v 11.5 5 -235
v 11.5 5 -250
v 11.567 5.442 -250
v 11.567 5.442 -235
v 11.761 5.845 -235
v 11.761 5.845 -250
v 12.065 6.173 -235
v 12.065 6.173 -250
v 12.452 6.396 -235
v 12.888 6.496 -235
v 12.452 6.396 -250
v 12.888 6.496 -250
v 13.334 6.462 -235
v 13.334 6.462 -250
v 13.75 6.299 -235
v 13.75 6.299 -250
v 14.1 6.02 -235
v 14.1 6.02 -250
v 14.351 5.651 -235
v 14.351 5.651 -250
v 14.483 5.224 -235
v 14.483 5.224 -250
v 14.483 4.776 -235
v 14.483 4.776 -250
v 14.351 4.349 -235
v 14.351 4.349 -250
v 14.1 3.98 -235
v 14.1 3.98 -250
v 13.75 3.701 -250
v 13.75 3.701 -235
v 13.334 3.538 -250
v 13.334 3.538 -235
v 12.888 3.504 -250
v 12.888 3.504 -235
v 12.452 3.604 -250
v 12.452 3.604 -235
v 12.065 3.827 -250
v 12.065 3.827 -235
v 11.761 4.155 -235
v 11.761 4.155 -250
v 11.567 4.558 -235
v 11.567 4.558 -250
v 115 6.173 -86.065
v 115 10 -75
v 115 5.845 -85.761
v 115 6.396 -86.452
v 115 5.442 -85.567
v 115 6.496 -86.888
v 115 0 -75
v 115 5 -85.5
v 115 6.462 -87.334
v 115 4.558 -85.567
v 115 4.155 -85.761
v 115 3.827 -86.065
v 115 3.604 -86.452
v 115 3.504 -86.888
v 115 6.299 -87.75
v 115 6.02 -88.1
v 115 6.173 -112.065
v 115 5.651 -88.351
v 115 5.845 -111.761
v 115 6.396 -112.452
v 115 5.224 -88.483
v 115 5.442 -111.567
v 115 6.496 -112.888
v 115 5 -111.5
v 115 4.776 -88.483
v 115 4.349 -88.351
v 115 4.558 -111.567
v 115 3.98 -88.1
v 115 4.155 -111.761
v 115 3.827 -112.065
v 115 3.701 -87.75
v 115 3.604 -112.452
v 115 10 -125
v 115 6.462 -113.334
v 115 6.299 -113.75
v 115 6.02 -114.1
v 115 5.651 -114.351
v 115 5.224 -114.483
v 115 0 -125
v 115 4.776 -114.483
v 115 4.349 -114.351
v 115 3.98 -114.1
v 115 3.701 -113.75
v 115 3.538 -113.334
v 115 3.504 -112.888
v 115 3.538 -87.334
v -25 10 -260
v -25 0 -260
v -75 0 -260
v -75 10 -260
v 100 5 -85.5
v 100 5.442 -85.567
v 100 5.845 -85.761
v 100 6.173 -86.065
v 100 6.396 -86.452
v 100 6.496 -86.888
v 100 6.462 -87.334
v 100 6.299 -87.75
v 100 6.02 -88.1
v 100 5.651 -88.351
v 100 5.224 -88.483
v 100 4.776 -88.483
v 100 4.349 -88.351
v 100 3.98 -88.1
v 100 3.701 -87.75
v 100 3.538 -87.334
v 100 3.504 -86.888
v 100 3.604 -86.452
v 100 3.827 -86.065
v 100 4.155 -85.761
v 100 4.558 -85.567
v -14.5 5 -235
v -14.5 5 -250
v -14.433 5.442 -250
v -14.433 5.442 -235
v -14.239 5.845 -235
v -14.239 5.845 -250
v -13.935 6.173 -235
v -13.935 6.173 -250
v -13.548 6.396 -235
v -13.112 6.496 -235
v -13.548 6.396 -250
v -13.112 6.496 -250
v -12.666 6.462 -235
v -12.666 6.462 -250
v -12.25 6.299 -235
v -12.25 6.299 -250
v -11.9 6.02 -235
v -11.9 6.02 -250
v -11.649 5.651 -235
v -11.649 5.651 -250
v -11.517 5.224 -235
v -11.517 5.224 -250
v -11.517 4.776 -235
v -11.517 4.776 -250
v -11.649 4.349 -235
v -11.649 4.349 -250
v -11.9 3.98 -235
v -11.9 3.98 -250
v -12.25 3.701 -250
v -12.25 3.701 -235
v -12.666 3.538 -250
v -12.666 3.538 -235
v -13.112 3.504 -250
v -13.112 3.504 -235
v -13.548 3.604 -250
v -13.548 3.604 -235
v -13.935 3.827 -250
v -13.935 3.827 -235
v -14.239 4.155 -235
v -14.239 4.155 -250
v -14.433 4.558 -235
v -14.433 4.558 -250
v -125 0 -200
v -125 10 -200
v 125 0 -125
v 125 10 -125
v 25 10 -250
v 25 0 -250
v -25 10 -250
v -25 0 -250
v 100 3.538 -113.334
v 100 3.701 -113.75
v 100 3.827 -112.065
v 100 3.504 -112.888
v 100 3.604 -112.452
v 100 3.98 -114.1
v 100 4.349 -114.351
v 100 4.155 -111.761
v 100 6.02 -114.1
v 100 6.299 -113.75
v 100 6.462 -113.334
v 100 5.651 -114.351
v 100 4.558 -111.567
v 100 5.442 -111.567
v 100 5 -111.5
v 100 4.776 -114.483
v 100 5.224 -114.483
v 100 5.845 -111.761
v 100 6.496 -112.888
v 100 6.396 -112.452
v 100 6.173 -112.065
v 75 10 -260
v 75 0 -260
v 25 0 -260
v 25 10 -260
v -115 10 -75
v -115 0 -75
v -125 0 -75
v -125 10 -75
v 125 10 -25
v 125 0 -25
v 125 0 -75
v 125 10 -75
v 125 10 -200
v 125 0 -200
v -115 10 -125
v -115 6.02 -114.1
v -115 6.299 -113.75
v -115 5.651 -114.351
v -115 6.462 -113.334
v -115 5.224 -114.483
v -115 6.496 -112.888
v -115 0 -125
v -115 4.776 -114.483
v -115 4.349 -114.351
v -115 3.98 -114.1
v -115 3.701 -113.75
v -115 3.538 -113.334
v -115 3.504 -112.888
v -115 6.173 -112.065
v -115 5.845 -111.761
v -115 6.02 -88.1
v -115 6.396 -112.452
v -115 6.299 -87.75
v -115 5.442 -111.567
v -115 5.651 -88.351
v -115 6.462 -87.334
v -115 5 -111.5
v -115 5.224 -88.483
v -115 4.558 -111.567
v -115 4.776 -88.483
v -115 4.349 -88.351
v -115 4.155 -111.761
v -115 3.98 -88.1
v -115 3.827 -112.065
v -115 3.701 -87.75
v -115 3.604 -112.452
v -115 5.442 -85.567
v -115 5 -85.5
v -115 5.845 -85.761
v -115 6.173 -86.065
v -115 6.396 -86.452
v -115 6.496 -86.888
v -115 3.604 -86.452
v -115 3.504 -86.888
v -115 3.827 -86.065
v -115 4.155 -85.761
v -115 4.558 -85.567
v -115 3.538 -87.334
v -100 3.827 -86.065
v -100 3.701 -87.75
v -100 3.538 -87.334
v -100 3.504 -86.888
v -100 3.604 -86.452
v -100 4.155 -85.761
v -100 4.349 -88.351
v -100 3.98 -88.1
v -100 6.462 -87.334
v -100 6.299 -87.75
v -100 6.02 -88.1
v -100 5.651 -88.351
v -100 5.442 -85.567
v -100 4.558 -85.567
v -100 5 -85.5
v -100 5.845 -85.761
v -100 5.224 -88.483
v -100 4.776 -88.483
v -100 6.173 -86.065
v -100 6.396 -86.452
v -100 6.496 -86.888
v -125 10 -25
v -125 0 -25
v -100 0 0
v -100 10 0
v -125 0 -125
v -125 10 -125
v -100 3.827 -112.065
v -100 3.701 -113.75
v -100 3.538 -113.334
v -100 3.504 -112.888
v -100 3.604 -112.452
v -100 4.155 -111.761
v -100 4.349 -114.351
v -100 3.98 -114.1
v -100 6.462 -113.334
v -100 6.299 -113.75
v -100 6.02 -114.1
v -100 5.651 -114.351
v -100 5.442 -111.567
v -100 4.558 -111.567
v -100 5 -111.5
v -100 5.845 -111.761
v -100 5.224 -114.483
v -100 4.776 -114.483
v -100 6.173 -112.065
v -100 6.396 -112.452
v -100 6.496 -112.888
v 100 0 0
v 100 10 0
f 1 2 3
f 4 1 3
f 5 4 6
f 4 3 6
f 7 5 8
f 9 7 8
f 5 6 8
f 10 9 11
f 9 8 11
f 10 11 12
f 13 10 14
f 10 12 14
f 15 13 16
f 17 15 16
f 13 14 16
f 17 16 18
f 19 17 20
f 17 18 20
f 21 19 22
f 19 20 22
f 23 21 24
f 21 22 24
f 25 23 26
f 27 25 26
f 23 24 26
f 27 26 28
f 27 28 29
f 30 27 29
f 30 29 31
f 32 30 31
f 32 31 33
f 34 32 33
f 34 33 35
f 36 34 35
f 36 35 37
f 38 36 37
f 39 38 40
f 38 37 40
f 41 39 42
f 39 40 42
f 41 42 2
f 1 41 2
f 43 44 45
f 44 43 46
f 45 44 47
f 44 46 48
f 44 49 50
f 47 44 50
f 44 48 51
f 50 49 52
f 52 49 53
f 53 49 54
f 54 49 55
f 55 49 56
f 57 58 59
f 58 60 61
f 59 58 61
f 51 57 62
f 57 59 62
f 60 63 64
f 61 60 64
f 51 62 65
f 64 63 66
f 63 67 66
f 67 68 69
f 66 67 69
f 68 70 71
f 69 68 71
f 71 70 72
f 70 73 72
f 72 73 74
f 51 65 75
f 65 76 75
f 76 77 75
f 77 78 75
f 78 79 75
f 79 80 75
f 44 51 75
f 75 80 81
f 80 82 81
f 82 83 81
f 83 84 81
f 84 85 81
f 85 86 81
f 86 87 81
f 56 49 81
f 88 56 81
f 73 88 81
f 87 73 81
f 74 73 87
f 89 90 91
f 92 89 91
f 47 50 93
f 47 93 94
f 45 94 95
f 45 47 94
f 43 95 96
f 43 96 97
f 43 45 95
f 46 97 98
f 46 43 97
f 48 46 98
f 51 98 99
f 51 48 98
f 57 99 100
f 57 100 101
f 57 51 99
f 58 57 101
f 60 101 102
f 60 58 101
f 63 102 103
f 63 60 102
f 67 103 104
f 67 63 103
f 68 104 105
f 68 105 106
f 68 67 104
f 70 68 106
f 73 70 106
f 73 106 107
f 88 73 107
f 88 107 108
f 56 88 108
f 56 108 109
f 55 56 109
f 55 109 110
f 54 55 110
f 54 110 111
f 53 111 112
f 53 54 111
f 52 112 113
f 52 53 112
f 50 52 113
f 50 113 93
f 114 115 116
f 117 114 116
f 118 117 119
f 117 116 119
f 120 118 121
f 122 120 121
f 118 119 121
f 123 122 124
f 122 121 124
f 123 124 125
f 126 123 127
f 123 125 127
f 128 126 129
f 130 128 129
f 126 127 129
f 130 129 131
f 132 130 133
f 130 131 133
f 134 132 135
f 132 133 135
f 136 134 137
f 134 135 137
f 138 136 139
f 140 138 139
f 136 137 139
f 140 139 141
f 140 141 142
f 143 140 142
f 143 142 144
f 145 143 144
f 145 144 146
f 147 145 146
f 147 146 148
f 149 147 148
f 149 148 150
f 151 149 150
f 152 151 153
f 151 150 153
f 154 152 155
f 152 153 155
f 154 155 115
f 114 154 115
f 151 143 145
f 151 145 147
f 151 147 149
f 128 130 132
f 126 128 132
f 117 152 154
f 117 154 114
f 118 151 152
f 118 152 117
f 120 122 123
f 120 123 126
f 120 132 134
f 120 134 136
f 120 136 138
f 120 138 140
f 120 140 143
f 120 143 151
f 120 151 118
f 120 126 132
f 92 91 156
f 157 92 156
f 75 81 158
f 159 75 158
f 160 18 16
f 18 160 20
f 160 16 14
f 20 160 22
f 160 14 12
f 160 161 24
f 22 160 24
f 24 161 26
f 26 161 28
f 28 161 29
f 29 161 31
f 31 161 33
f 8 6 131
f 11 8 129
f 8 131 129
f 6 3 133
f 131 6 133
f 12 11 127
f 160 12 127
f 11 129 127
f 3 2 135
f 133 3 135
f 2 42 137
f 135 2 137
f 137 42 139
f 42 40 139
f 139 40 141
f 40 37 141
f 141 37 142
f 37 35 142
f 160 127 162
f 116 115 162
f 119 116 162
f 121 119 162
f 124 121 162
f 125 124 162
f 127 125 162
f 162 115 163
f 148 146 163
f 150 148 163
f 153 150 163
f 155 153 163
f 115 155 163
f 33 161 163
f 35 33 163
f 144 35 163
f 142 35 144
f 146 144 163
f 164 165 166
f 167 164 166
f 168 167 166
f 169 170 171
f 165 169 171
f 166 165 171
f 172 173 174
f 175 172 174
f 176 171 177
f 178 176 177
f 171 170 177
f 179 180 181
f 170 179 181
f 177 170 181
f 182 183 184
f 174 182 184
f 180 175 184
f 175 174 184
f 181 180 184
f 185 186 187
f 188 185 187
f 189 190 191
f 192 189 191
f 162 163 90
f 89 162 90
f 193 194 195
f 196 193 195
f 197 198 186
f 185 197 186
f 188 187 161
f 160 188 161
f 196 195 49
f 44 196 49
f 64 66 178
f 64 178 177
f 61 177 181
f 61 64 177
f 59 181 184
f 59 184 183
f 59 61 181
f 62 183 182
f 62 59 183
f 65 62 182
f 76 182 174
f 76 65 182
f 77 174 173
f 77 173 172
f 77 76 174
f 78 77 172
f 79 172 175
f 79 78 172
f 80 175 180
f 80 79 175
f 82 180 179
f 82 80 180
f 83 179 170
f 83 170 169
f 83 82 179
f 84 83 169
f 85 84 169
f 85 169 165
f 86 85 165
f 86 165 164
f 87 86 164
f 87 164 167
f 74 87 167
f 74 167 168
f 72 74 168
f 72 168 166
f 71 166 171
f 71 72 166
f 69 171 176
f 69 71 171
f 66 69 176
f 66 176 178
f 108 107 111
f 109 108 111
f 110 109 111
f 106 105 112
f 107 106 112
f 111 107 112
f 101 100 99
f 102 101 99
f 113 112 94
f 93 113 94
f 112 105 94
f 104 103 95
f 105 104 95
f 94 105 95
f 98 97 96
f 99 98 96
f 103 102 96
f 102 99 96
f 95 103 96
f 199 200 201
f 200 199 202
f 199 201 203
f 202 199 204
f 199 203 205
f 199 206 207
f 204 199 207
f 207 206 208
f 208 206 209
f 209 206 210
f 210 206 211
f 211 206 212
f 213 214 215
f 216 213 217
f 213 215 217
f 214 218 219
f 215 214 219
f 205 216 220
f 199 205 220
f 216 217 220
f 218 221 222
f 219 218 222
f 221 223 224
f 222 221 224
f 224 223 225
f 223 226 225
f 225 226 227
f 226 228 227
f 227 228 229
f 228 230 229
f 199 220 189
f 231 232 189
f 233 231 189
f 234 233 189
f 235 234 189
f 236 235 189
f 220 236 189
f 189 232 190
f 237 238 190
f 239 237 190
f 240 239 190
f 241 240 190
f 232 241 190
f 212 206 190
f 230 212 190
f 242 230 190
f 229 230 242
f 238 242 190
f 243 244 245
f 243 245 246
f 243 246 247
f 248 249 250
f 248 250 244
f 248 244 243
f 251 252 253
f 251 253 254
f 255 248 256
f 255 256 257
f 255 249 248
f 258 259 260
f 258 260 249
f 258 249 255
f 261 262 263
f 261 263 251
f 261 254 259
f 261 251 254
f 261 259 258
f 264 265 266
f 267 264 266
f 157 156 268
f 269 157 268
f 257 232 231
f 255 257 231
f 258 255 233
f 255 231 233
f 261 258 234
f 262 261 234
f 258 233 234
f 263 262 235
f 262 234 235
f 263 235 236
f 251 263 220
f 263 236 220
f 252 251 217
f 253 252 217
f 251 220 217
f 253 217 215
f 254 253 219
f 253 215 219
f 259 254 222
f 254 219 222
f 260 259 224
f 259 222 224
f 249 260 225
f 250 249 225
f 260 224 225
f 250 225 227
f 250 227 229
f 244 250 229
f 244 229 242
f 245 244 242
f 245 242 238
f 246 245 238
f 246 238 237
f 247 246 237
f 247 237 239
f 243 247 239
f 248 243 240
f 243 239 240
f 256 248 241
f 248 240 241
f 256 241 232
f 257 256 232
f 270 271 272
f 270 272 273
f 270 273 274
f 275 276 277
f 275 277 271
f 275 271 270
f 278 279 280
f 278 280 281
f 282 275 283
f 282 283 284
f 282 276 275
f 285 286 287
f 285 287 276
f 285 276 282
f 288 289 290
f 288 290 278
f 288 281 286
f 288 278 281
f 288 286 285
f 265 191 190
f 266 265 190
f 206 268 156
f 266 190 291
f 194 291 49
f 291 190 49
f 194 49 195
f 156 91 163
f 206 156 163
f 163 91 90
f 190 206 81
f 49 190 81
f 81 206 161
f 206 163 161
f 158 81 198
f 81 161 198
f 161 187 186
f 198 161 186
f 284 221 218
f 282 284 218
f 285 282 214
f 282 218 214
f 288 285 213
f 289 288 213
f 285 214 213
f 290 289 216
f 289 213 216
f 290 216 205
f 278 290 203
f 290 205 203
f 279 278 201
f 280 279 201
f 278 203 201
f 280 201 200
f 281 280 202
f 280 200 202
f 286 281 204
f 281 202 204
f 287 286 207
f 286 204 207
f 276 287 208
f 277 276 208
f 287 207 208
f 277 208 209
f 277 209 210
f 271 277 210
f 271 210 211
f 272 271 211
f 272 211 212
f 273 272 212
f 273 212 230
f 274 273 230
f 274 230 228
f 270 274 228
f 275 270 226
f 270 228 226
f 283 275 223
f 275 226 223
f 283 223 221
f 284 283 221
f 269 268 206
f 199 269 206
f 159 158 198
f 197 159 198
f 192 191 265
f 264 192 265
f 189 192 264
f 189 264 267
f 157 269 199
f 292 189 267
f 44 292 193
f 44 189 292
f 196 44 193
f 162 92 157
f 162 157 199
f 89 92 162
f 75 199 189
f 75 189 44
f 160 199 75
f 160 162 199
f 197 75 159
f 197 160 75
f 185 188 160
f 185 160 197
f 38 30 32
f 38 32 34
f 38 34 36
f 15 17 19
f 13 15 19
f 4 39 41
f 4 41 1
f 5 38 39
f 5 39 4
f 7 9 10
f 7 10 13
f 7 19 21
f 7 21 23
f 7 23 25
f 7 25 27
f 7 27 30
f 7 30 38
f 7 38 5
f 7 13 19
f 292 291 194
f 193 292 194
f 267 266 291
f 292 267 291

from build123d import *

# Parameters (mm, degrees)
BOSS_EXTRUDE1_DEPTH = 10
SKETCH2_R           = 1.5
CUT_EXTRUDE1_DEPTH  = 15
SKETCH3_R           = 1.5
CUT_EXTRUDE2_DEPTH  = 15


with BuildPart() as part:
    # Sketch1 → Boss-Extrude1 (new body)
    with BuildSketch(Plane(origin=(0, 0, 0), x_dir=(1, 0, 0), z_dir=(0, 1, 0))):
        Polygon((-125, 200), (-125, 125), (-115, 125), (-115, 75), (-125, 75), (-125, 25), (-100, 0), (100, 0), (125, 25), (125, 75), (115, 75), (115, 125), (125, 125), (125, 200), (75, 260), (25, 260), (25, 250), (-25, 250), (-25, 260), (-75, 260), align=None)
    extrude(amount=BOSS_EXTRUDE1_DEPTH)

    # Sketch2 → Cut-Extrude1 (cut)
    with BuildSketch(Plane.ZY.offset(115)):
        with Locations((-113, 5)):
            Circle(SKETCH2_R)
        with Locations((-87, 5)):
            Circle(SKETCH2_R)
    cut_extrude1 = extrude(amount=-CUT_EXTRUDE1_DEPTH, mode=Mode.SUBTRACT)

    # Mirror1: Cut-Extrude1 across plane
    add(cut_extrude1.mirror(Plane(origin=(0, 0, 0), x_dir=(0, 0, 1), z_dir=(1, 0, 0))), mode=Mode.SUBTRACT)

    # Sketch3 → Cut-Extrude2 (cut)
    with BuildSketch(Plane(origin=(0, 0, -250), x_dir=(-1, 0, 0), z_dir=(0, 0, -1))):
        with Locations((-13, 5)):
            Circle(SKETCH3_R)
        with Locations((13, 5)):
            Circle(SKETCH3_R)
    extrude(amount=-CUT_EXTRUDE2_DEPTH, mode=Mode.SUBTRACT)


solid = part.part
